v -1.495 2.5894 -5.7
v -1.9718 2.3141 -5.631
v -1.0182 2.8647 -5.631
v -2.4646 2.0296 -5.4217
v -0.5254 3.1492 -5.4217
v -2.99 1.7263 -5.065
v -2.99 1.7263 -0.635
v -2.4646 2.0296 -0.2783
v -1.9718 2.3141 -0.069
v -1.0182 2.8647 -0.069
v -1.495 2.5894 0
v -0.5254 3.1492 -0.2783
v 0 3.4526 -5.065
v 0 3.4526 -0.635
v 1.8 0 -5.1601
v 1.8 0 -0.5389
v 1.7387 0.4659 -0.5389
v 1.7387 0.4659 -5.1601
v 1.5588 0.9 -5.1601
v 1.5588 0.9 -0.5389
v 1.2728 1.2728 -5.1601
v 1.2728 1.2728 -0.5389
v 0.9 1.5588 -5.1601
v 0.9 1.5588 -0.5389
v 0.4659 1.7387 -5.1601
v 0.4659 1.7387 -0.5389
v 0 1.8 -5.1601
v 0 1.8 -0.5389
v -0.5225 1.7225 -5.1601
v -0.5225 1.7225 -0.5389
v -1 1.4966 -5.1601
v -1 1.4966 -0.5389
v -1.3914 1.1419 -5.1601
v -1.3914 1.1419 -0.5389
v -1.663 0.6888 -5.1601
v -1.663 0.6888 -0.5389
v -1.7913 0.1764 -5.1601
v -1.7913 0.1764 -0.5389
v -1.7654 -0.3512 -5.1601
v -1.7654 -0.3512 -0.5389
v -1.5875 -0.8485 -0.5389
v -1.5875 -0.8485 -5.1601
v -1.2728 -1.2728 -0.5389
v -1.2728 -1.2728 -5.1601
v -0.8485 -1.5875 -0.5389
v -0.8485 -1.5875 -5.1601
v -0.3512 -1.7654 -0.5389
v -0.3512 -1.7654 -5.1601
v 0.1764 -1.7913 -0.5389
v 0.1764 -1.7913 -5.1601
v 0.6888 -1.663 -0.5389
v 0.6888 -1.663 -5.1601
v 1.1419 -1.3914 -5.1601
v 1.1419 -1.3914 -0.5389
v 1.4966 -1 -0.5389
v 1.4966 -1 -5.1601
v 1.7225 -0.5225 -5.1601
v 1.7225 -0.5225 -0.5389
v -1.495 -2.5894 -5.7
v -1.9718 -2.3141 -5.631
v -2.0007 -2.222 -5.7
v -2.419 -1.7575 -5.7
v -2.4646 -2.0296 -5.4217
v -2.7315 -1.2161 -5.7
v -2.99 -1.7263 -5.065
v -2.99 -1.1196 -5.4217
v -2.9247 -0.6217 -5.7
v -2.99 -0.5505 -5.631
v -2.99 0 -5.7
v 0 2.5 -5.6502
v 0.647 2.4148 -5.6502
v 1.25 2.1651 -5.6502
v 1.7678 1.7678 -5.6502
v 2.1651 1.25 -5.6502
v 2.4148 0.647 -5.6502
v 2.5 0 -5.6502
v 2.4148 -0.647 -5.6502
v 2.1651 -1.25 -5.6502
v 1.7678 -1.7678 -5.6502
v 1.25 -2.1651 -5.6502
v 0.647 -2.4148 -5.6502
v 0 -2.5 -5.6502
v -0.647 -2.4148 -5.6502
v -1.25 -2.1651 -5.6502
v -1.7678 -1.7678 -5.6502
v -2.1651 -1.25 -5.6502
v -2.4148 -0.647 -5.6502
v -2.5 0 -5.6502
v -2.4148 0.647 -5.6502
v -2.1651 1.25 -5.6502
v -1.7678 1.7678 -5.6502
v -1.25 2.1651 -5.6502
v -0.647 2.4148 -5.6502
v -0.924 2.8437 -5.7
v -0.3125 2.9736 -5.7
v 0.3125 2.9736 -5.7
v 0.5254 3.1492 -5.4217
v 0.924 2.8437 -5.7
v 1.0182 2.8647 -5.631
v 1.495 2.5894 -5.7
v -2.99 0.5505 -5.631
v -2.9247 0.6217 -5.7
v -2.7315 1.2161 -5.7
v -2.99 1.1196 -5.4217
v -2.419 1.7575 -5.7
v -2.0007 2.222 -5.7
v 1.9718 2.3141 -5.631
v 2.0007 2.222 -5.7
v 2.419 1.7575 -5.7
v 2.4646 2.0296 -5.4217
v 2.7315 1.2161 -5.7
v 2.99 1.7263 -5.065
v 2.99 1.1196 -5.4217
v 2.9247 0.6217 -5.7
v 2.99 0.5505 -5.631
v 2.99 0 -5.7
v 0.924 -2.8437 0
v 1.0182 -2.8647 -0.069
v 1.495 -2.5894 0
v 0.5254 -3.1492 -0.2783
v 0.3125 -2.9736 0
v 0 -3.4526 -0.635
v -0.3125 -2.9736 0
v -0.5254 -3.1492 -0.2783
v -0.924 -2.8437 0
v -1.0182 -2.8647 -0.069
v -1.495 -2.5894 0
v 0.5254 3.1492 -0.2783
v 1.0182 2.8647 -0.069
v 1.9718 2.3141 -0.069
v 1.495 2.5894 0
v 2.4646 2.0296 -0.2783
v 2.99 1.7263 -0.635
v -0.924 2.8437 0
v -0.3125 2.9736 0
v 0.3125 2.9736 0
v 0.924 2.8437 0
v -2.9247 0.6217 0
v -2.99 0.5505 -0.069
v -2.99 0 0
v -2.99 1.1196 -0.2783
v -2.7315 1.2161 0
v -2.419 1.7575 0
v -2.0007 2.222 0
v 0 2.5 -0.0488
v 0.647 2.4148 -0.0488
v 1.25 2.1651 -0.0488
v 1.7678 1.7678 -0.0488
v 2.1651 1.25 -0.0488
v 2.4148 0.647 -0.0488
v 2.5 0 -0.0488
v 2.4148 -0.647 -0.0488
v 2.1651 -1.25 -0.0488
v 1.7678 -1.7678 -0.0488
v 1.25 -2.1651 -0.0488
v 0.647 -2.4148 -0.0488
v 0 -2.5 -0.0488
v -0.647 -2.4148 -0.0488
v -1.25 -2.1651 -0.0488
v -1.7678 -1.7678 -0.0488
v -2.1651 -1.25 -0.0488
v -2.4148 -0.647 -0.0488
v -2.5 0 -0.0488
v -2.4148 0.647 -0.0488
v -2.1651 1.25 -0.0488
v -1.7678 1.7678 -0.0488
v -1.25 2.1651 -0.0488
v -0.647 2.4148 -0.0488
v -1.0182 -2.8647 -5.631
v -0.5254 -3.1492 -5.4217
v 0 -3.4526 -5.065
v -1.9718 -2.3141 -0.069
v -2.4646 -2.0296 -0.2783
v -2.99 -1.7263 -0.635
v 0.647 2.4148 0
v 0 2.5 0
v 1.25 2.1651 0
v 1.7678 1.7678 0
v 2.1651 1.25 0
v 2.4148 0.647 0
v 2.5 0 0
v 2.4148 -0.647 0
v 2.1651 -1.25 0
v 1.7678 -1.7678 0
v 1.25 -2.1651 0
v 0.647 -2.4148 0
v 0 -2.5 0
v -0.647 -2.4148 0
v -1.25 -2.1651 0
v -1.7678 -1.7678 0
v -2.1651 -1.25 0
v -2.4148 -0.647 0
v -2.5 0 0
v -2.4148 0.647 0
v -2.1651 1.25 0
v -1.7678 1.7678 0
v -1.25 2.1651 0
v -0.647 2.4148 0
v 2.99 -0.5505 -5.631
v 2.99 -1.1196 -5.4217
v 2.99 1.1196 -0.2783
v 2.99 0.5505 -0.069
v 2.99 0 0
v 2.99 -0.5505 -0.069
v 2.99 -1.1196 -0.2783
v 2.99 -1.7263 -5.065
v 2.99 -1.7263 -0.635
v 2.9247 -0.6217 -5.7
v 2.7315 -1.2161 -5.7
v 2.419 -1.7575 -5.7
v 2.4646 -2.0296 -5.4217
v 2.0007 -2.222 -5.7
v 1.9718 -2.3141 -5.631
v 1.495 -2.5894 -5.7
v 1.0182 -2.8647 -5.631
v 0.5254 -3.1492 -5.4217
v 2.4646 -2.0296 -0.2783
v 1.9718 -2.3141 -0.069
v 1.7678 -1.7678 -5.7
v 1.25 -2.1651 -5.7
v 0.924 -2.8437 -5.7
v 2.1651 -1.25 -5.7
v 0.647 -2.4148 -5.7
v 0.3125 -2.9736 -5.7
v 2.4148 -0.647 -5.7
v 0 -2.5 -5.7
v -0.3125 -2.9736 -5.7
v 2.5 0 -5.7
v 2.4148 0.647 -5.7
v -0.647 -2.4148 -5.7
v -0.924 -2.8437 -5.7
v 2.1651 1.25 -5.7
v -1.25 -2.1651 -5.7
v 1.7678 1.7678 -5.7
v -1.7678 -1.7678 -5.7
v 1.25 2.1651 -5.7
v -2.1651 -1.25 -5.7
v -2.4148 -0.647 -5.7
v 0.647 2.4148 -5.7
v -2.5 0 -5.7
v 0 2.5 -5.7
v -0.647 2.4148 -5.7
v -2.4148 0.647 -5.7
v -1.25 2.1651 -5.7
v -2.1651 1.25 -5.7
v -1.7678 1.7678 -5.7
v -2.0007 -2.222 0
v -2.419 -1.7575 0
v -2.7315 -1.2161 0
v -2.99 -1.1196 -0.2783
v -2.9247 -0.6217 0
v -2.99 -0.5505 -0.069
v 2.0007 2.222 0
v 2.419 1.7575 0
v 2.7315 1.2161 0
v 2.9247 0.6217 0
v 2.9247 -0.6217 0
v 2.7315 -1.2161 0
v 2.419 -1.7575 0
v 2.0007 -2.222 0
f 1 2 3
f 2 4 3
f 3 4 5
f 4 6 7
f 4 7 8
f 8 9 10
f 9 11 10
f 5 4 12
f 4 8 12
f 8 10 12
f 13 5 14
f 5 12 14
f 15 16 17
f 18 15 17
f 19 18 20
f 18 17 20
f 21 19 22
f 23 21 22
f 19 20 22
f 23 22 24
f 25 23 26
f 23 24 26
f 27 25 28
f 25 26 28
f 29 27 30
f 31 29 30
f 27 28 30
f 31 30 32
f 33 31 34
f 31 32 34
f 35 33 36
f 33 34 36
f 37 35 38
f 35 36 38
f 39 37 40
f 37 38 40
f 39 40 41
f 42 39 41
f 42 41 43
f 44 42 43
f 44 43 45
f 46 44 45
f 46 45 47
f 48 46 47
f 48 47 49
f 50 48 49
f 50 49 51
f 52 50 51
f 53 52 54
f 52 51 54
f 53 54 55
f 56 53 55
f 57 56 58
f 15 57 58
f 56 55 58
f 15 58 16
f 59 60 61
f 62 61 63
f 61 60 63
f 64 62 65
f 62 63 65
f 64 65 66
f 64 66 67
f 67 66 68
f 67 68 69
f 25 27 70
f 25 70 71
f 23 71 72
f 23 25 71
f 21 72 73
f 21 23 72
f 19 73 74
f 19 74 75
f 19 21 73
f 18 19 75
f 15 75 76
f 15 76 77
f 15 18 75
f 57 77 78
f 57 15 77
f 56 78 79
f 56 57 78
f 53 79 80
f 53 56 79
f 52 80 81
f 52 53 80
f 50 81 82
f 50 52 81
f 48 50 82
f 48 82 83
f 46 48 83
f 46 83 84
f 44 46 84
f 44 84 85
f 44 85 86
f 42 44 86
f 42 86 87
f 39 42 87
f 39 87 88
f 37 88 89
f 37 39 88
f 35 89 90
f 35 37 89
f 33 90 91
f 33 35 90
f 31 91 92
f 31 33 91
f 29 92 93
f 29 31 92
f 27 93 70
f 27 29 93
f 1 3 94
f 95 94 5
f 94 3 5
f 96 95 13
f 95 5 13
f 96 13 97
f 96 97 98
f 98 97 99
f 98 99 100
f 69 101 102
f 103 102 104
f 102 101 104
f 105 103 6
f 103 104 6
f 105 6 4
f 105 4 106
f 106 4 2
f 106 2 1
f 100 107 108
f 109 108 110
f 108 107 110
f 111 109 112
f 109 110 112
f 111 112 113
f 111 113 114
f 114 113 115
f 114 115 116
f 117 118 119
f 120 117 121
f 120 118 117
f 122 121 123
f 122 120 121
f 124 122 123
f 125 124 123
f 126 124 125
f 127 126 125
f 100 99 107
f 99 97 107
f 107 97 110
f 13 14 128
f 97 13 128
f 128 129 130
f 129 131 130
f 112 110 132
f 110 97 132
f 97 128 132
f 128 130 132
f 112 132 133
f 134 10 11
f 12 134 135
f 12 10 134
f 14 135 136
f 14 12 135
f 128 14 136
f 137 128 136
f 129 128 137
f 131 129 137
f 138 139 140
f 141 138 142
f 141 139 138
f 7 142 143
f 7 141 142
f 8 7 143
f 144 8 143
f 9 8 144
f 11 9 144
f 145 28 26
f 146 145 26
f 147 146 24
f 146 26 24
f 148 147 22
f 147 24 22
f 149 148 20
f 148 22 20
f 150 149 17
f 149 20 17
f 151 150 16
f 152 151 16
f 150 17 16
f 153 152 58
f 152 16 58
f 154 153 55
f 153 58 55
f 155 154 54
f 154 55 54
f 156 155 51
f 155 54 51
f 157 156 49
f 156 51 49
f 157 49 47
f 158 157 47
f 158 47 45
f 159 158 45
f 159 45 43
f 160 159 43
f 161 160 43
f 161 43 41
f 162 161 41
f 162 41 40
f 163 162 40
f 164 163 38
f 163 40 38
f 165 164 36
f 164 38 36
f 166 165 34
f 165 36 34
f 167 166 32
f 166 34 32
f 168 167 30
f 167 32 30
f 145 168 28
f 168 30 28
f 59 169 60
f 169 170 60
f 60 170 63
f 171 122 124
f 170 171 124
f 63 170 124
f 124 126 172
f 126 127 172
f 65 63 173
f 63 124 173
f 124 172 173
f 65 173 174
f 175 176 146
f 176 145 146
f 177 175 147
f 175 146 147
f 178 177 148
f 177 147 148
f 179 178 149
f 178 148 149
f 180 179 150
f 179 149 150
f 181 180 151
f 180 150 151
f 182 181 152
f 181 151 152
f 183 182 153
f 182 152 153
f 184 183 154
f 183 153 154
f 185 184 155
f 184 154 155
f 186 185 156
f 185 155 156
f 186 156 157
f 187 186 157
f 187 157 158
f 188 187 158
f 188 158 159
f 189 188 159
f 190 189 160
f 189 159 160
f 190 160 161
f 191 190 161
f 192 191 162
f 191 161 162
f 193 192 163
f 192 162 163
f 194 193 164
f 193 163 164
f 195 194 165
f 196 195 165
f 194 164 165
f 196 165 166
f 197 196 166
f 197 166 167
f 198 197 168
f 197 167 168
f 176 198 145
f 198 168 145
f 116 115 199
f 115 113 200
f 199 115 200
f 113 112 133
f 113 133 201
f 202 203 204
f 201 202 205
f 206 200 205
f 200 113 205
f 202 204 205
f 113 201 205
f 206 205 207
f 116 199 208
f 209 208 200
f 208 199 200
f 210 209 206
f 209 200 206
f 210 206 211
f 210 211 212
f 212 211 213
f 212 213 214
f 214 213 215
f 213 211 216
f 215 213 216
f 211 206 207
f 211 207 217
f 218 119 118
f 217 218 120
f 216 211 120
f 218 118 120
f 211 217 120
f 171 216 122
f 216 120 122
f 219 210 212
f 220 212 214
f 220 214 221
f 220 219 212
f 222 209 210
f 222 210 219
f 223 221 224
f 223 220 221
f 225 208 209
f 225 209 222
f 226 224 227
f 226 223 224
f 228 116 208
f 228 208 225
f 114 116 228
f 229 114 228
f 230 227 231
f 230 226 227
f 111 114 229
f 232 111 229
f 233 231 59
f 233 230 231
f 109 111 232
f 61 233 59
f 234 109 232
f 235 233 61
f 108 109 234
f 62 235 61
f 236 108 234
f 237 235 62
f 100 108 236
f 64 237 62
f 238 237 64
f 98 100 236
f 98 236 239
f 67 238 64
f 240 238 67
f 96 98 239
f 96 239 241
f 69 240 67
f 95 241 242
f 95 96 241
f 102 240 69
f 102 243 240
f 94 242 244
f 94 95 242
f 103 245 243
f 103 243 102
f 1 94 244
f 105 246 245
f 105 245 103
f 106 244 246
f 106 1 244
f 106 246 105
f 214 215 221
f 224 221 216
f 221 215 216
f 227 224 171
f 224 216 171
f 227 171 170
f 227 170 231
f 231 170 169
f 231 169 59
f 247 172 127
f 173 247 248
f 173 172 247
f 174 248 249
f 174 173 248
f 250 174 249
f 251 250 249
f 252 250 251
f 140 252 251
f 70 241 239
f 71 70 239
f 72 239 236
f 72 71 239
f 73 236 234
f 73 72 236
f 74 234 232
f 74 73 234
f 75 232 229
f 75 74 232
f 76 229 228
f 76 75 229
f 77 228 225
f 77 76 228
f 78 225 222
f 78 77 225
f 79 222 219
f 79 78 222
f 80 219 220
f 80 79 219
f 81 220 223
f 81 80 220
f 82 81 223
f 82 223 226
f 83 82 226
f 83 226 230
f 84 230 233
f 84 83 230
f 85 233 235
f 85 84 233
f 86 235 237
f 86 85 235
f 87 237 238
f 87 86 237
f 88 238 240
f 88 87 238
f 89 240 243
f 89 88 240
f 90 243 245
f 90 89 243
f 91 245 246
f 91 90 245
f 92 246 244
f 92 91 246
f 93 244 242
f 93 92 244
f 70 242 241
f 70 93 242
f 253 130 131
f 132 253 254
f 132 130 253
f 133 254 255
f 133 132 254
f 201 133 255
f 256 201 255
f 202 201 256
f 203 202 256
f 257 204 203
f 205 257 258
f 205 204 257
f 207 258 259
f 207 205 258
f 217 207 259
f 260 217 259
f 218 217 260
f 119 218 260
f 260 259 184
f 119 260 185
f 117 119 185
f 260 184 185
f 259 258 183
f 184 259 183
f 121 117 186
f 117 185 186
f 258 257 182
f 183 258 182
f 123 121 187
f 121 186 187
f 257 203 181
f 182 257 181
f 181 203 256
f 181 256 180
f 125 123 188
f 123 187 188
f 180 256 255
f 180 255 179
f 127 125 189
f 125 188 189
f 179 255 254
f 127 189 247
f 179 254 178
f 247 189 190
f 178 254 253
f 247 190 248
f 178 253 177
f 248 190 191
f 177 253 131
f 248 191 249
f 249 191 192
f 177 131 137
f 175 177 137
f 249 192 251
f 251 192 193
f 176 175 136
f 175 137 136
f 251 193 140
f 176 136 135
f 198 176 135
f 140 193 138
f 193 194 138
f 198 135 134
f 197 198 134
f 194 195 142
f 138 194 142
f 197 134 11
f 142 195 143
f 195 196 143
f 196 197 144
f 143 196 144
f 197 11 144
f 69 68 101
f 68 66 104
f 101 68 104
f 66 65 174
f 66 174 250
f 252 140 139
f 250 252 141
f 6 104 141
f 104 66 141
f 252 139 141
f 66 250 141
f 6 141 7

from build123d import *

# Parameters (mm, degrees)
BASENUTSKE_R  = 1.8
BASENUT_DEPTH = 5.7


with BuildPart() as part:
    # BaseNutSke → BaseNut (new body)
    with BuildSketch(Plane.XY):
        Polygon((2.99, 1.726277305), (2.99, -1.726277305), (0, -3.45255461), (-2.99, -1.726277305), (-2.99, 1.726277305), (0, 3.45255461), align=None)
        Circle(BASENUTSKE_R, mode=Mode.SUBTRACT)
    extrude(amount=-BASENUT_DEPTH)

    # Sketch3 → Double-Chamfer (revolve, cut)
    with BuildSketch(Plane(origin=(0, 0, 0), x_dir=(0, 0, -1), z_dir=(1, 0, 0))):
        Polygon((5.7, 2.99), (5.065, 3.45255461), (5.065, 16.15255461), (18.4, 16.15255461), (18.4, 2.99), align=None)
        Polygon((0.635, 16.15255461), (-12.7, 16.15255461), (-12.7, 2.99), (0, 2.99), (0.635, 3.45255461), align=None)
    revolve(axis=Axis((0, 0, 0), (0, 0, -1)), mode=Mode.SUBTRACT)

    # Sketch5 → EndChamfer (revolve, cut)
    with BuildSketch(Plane(origin=(0, 0, 0), x_dir=(0, 0, -1), z_dir=(1, 0, 0))):
        Polygon((5.6502, 2.5), (4.591136098, 0.9875), (5.701, 0.9875), (5.701, 2.5), align=None)
        Polygon((-0.002, 2.5), (0.0488, 2.5), (1.107863902, 0.9875), (-0.002, 0.9875), align=None)
    revolve(axis=Axis((0, 0, -25.037505729), (0, 0, -1)), mode=Mode.SUBTRACT)


solid = part.part
